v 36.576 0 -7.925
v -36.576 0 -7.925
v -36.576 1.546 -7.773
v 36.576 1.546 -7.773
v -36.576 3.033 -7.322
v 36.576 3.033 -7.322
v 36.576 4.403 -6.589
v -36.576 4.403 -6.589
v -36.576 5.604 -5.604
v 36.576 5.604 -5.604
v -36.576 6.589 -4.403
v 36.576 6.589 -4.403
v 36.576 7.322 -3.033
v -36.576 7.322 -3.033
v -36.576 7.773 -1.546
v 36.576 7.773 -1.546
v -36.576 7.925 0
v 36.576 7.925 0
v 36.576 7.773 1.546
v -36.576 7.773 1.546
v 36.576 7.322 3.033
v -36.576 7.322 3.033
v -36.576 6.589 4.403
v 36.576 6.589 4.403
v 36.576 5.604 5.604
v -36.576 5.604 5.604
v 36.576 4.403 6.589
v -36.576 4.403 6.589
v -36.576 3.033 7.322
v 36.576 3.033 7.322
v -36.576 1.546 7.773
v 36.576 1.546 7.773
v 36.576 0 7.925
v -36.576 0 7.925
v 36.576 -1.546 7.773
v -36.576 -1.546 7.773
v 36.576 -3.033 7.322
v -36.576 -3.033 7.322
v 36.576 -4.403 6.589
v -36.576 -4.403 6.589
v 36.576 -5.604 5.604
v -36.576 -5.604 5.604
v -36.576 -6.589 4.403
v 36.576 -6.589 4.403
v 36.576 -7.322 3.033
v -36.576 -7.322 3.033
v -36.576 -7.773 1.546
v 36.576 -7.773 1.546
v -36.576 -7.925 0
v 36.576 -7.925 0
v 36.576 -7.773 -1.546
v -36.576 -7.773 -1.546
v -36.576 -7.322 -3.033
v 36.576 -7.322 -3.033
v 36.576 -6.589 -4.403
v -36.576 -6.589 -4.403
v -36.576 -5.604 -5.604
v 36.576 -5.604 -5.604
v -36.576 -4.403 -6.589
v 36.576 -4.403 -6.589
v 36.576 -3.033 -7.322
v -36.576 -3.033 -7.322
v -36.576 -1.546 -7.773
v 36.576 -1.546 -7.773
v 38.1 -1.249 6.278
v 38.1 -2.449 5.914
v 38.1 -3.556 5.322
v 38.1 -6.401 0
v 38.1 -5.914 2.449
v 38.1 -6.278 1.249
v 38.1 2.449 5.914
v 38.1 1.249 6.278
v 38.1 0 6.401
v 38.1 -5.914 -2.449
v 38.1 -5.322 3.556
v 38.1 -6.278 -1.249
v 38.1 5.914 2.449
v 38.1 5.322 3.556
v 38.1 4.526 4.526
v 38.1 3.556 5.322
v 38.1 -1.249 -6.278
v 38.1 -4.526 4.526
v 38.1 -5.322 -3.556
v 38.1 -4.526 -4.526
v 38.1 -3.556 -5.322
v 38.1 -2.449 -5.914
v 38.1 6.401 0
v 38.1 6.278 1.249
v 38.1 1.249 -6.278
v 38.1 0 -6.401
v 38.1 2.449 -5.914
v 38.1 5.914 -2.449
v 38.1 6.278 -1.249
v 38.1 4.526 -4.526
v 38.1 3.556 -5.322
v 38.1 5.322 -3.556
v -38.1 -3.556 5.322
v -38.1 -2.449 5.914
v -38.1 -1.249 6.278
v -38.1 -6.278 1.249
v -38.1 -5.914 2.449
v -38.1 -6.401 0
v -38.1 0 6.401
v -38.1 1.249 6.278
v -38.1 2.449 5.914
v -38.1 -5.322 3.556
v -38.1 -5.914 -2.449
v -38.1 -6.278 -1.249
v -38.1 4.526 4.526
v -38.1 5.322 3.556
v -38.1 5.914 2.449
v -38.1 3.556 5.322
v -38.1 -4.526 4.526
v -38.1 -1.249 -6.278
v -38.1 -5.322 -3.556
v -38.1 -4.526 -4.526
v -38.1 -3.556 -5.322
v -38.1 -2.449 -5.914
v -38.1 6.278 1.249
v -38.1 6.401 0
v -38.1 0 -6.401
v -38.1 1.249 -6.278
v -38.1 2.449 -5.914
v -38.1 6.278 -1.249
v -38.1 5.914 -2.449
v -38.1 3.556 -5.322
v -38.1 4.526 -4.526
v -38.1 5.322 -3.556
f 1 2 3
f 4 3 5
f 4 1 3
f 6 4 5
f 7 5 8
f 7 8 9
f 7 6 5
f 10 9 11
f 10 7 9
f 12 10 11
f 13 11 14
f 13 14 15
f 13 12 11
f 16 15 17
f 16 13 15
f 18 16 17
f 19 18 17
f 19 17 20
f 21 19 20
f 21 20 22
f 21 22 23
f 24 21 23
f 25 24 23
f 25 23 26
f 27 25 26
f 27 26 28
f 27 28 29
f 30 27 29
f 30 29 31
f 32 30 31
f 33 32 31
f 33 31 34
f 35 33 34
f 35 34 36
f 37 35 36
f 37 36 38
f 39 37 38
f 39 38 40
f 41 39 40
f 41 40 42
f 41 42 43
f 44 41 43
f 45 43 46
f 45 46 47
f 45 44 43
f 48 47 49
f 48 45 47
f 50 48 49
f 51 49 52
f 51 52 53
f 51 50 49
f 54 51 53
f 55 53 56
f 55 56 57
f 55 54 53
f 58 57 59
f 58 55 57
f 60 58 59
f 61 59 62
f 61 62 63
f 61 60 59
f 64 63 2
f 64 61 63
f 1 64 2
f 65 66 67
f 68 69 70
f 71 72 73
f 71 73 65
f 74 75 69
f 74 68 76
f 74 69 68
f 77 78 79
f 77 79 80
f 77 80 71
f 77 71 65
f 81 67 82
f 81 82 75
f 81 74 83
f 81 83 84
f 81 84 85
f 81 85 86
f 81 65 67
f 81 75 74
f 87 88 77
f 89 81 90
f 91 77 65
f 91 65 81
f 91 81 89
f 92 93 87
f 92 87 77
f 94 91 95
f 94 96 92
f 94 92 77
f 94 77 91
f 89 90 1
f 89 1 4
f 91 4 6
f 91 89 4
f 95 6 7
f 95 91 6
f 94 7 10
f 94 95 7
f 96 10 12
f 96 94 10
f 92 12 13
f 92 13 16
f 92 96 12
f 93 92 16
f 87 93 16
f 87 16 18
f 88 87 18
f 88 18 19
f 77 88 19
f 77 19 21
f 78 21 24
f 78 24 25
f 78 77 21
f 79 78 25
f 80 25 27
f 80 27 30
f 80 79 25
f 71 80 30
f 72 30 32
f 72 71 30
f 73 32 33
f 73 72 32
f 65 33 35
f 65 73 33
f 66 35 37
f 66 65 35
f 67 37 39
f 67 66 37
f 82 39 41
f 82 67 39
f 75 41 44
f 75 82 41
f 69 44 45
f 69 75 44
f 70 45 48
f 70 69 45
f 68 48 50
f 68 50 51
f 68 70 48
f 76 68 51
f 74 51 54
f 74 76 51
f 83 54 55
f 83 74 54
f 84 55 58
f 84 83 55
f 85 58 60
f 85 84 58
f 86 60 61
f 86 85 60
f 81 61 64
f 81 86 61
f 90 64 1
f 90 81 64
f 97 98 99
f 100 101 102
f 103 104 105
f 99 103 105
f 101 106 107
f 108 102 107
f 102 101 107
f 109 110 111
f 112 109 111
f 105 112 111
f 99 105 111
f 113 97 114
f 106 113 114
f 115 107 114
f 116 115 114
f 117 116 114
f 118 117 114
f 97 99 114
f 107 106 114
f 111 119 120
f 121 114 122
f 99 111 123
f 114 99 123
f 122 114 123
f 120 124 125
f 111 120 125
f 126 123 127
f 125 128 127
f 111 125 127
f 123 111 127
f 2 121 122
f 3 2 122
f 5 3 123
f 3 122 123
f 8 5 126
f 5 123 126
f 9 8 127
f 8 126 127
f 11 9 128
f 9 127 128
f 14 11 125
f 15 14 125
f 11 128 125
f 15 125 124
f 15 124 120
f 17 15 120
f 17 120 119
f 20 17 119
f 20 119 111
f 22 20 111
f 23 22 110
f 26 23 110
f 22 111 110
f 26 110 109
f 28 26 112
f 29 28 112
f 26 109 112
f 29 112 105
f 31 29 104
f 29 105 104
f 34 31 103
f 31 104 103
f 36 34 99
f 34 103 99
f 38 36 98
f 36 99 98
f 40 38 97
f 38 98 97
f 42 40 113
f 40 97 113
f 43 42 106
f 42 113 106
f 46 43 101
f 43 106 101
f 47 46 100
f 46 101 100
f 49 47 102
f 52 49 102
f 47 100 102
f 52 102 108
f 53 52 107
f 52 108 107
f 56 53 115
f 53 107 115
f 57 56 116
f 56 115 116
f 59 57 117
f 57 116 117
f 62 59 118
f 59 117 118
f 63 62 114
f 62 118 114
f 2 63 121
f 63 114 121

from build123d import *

# Parameters (mm, degrees)
SKETCH1_R           = 7.9248
BOSS_EXTRUDE1_DEPTH = 38.1
CHAMFER1_SIZE       = 1.524
CHAMFER2_SIZE       = 1.524


with BuildPart() as part:
    # Sketch1 → Boss-Extrude1 (new body, symmetric)
    with BuildSketch(Plane(origin=(0, 0, 0), x_dir=(0, 0, -1), z_dir=(1, 0, 0))):
        Circle(SKETCH1_R)
    extrude(amount=BOSS_EXTRUDE1_DEPTH, both=True)

    # Chamfer1
    chamfer1_edges = [part.edges().sort_by_distance(p)[0] for p in [
        (38.1, 0, 7.9248),
    ]]
    chamfer(chamfer1_edges, length=CHAMFER1_SIZE)

    # Chamfer2
    chamfer2_edges = [part.edges().sort_by_distance(p)[0] for p in [
        (-38.1, 0, 7.9248),
    ]]
    chamfer(chamfer2_edges, length=CHAMFER2_SIZE)


solid = part.part
